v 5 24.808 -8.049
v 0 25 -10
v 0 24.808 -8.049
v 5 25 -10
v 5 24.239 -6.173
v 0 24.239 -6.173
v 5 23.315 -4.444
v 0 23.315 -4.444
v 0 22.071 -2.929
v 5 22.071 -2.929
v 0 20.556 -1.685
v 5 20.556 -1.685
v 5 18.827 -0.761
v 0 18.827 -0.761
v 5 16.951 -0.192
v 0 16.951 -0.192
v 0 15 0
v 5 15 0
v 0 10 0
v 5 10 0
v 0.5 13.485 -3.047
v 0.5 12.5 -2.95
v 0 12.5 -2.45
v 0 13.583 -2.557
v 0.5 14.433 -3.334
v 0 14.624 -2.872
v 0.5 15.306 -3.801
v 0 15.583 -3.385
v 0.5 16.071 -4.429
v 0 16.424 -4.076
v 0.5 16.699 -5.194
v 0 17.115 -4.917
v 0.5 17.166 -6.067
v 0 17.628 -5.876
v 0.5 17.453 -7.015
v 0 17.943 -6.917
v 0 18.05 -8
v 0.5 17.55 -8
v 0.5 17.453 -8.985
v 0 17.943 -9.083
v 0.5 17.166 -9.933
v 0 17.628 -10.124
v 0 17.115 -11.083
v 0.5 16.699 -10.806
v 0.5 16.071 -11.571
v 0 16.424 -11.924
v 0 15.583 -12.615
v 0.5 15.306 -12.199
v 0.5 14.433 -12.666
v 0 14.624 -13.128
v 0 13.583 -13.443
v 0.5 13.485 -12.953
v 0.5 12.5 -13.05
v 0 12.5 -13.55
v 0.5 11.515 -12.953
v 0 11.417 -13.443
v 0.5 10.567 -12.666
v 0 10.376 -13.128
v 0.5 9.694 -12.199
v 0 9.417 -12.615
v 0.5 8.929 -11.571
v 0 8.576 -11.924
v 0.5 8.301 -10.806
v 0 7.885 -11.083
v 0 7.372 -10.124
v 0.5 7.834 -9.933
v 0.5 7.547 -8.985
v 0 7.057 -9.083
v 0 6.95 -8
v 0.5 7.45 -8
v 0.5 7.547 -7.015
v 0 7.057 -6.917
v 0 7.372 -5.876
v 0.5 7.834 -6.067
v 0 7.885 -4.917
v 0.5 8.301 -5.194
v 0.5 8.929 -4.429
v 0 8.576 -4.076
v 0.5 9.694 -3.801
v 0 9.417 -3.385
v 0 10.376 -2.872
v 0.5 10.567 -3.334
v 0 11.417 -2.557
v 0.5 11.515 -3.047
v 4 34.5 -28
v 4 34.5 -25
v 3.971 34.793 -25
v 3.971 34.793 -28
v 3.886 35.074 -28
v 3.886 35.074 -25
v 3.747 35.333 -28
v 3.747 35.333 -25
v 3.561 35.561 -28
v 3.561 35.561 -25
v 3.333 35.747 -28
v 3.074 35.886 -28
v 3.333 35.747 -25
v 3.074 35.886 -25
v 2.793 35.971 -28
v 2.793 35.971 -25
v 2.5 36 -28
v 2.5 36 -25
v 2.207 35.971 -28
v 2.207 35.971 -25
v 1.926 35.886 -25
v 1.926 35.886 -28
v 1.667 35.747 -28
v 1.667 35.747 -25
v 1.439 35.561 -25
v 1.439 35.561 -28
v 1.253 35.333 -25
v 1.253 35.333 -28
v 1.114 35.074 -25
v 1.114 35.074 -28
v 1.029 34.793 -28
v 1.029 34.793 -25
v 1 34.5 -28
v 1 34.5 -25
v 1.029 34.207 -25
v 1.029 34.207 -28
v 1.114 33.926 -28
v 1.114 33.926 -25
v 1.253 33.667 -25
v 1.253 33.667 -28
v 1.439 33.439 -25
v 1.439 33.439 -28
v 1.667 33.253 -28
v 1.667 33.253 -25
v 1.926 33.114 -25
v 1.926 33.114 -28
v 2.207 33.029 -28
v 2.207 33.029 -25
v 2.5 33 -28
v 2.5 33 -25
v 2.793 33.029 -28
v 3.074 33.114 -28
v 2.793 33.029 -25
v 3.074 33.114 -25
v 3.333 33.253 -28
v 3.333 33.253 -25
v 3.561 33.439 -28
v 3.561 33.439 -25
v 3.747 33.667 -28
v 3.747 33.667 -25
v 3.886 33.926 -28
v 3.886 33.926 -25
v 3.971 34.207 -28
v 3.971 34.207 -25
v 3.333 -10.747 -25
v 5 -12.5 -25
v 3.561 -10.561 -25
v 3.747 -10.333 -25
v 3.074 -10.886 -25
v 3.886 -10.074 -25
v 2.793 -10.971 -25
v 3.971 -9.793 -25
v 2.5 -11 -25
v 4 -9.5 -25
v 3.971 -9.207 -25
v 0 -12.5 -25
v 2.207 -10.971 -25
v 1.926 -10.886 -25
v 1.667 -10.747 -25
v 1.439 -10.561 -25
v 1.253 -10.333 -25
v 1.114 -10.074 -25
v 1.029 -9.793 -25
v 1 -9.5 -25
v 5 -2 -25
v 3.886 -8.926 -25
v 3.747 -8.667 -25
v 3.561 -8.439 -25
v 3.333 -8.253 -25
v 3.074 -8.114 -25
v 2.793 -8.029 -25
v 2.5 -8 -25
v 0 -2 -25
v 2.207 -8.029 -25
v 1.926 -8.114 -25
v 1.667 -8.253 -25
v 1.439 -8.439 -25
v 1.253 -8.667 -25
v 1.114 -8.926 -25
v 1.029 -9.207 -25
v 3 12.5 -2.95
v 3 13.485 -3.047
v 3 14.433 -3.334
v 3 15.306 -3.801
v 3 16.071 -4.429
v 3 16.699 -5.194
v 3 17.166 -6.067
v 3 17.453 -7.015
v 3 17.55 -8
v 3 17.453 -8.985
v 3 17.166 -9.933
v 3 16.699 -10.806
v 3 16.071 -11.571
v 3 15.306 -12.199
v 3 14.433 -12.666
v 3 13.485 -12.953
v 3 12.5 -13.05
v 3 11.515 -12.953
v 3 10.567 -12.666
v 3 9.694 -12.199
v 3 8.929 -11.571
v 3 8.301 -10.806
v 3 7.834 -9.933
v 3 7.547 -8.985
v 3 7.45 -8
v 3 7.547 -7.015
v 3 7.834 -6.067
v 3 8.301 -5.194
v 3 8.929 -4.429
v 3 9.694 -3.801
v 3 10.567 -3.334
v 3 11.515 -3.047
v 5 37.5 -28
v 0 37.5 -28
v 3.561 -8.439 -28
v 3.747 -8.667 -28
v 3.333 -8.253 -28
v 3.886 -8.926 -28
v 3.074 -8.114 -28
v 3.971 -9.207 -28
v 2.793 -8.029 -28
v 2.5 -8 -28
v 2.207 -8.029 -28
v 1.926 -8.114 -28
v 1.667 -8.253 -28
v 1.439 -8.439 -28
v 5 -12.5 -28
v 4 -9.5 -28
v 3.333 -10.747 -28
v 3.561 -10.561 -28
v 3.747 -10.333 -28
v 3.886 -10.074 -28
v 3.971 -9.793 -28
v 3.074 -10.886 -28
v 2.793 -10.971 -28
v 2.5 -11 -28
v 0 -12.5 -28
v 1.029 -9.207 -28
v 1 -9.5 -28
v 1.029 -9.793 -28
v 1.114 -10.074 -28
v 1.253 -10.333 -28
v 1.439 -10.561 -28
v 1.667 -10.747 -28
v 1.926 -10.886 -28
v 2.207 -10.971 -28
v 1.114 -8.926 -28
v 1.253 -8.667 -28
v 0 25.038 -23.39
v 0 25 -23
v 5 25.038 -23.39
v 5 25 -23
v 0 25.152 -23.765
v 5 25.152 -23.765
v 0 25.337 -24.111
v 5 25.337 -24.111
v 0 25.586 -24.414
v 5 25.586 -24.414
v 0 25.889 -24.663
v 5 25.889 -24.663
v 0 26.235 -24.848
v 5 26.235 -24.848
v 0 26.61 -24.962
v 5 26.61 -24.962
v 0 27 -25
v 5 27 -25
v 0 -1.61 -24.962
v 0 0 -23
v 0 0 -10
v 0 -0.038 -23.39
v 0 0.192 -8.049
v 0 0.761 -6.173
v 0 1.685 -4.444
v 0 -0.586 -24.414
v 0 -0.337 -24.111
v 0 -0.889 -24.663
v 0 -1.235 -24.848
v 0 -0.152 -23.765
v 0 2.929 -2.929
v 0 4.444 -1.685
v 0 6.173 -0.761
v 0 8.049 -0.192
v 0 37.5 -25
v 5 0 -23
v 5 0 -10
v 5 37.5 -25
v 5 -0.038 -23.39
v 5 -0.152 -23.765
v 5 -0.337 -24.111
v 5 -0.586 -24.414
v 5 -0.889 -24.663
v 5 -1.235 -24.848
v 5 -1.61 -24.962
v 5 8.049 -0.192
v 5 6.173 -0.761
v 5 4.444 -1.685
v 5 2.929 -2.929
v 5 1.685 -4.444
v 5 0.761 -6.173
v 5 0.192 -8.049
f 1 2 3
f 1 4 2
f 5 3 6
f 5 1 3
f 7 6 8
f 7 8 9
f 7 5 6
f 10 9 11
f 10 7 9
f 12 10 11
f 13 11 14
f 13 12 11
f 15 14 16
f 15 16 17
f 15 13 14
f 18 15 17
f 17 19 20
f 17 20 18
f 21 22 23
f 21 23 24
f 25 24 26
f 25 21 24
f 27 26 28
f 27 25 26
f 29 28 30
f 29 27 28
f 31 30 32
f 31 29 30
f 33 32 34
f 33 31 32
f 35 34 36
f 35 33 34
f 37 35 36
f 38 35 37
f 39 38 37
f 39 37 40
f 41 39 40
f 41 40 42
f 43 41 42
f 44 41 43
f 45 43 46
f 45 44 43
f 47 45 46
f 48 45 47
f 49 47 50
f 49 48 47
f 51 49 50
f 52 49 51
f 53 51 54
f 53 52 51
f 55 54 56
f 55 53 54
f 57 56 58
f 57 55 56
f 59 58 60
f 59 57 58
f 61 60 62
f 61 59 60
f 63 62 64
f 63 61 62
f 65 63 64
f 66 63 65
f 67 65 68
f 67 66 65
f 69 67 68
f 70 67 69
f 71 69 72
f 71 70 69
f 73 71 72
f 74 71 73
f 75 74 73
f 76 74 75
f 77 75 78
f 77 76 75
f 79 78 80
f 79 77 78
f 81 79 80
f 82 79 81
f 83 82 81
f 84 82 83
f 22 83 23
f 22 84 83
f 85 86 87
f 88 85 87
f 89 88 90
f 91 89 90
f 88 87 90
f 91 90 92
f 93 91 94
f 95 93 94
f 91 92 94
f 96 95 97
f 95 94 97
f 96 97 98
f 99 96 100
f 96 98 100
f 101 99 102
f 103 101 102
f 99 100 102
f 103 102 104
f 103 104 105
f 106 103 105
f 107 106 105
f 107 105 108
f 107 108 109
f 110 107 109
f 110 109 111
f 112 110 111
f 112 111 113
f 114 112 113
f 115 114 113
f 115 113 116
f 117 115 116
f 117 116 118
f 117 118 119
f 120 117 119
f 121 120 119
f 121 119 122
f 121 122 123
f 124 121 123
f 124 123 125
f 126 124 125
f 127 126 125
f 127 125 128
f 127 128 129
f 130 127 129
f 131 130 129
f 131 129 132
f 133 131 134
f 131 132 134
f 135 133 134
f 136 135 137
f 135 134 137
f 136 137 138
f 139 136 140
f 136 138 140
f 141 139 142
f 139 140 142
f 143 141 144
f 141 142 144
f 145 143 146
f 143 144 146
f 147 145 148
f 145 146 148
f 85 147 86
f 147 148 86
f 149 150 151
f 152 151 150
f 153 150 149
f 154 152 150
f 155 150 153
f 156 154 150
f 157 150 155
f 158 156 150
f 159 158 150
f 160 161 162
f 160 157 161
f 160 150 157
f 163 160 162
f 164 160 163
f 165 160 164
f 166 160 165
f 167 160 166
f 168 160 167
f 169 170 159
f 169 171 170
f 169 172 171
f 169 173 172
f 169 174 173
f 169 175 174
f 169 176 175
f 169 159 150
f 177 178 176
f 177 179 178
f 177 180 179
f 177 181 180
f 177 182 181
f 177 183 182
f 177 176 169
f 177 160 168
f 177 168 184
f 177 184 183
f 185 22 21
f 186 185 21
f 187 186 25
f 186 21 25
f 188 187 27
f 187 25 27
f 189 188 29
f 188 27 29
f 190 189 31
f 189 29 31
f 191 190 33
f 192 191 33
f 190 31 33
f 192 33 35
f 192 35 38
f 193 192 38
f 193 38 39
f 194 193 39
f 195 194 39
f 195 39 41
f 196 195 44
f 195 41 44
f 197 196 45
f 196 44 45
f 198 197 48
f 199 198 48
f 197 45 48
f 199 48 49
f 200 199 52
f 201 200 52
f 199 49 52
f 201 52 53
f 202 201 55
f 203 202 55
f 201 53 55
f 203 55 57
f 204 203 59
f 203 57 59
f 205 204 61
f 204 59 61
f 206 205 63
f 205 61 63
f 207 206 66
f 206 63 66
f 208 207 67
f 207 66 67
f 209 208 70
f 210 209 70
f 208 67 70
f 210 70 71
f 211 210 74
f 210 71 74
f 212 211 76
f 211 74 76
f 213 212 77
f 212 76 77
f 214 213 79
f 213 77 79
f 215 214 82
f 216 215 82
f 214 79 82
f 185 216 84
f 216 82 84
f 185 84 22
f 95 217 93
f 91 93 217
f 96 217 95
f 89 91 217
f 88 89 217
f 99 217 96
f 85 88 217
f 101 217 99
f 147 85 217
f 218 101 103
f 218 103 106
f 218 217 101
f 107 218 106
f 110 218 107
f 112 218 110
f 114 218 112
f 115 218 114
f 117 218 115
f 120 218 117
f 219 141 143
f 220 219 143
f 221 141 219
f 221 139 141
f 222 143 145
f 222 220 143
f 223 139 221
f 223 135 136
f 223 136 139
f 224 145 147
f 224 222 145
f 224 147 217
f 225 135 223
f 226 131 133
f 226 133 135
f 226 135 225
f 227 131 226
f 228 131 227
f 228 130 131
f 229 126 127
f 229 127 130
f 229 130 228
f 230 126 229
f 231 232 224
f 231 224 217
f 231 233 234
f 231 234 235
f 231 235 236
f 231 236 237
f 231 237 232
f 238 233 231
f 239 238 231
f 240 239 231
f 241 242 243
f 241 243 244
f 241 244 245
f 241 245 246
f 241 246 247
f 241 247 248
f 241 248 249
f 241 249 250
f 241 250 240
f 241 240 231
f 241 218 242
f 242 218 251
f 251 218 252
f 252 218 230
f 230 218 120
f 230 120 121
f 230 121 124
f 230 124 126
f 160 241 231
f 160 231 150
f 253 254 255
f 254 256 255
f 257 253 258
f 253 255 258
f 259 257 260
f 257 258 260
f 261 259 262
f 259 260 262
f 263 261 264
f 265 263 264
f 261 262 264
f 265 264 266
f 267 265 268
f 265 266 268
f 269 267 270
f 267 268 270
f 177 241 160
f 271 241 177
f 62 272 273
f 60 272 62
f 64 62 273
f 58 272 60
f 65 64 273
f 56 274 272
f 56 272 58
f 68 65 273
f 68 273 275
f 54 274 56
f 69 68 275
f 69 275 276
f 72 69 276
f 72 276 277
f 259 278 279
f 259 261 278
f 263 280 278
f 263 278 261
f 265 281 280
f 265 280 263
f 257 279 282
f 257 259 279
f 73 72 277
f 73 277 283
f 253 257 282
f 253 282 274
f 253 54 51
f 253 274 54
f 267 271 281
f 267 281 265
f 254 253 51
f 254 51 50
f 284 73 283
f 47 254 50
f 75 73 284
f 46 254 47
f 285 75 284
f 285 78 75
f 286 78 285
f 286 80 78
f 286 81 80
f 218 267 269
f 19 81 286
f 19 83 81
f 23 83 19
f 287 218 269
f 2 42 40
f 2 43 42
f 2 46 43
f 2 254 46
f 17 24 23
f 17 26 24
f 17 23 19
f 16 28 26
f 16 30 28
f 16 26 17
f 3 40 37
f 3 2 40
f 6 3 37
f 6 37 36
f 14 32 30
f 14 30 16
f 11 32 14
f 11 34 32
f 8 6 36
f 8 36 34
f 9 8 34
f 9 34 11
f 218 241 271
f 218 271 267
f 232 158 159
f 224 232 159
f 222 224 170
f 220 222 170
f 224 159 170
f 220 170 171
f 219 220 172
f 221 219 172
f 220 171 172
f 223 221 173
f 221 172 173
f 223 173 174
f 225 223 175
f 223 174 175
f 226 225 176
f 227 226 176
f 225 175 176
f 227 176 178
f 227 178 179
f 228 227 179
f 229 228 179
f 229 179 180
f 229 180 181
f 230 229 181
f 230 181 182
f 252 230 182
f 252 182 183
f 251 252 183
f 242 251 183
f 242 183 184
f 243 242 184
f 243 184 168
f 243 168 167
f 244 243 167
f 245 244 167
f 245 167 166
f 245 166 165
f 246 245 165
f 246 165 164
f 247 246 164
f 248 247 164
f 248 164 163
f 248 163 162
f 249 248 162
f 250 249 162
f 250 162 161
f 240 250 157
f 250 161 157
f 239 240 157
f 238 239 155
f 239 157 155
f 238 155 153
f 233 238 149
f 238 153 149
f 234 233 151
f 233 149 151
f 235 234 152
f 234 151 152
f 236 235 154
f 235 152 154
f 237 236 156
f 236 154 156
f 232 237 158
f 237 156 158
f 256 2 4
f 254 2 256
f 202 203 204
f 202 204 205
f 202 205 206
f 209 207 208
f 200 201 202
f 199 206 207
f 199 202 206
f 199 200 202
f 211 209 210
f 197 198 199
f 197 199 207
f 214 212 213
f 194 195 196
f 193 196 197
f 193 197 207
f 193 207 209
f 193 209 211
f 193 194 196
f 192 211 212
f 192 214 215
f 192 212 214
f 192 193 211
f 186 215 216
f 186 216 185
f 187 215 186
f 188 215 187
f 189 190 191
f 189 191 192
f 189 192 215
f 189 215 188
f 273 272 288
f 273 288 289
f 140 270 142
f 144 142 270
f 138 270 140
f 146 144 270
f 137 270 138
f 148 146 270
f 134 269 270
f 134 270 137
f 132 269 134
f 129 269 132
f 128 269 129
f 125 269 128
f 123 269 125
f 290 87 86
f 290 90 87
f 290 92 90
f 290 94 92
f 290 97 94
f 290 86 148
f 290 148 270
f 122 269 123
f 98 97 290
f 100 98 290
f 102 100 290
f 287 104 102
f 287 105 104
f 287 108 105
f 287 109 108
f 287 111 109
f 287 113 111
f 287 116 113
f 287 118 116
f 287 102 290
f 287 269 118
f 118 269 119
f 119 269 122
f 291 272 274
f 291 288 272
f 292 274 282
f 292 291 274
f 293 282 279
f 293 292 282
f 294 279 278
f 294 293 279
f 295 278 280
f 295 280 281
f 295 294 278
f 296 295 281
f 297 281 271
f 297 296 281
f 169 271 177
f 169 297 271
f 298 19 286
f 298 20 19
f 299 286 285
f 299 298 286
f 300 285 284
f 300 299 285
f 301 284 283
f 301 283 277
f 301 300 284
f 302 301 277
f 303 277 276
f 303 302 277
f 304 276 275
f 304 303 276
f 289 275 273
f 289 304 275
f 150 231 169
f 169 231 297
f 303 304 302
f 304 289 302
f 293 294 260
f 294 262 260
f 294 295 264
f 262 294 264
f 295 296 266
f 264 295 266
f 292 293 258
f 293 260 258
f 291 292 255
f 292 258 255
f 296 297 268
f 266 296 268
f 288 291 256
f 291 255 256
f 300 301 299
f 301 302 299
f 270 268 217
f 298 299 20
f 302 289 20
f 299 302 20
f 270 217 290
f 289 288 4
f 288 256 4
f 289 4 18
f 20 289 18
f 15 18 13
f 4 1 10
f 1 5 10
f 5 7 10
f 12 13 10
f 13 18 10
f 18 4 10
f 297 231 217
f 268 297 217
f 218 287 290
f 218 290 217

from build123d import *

# Parameters (mm, degrees)
EXTRUDE_2_DEPTH     = 5
SKETCH_2_R          = 1.5
CUT_EXTRUDE_1_DEPTH = 4
SKETCH_3_R          = 5.05
CUT_EXTRUDE_2_DEPTH = 3
CHAMFER_1_SIZE      = 0.5
FILLET_1_R          = 10
FILLET_2_R          = 2


with BuildPart() as part:
    # 草图1 → 凸台-拉伸2 (new body)
    with BuildSketch(Plane(origin=(0, 0, 0), x_dir=(0, 0, -1), z_dir=(1, 0, 0))):
        Polygon((25, 25), (25, 37.5), (28, 37.5), (28, -12.5), (25, -12.5), (25, 0), (0, 0), (0, 25), align=None)
    extrude(amount=EXTRUDE_2_DEPTH)

    # 草图2 → 切除-拉伸1 (cut)
    with BuildSketch(Plane.XY.offset(-25)):
        with Locations((2.5, 34.5)):
            Circle(SKETCH_2_R)
        with Locations((2.5, -9.5)):
            Circle(SKETCH_2_R)
    extrude(amount=-CUT_EXTRUDE_1_DEPTH, mode=Mode.SUBTRACT)

    # 草图3 → 切除-拉伸2 (cut)
    with BuildSketch(Plane.ZY):
        with Locations((-8, 12.5)):
            Circle(SKETCH_3_R)
    extrude(amount=-CUT_EXTRUDE_2_DEPTH, mode=Mode.SUBTRACT)

    # 倒角1
    chamfer_1_edges = [part.edges().sort_by_distance(p)[0] for p in [
        (0, 12.5, -13.05),
    ]]
    chamfer(chamfer_1_edges, length=CHAMFER_1_SIZE)

    # 圆角1
    fillet_1_edges = [part.edges().sort_by_distance(p)[0] for p in [
        (2.5, 25, 0),
        (2.5, 0, 0),
    ]]
    fillet(fillet_1_edges, radius=FILLET_1_R)

    # 圆角2
    fillet_2_edges = [part.edges().sort_by_distance(p)[0] for p in [
        (2.5, 25, -25),
        (2.5, 0, -25),
    ]]
    fillet(fillet_2_edges, radius=FILLET_2_R)


solid = part.part
